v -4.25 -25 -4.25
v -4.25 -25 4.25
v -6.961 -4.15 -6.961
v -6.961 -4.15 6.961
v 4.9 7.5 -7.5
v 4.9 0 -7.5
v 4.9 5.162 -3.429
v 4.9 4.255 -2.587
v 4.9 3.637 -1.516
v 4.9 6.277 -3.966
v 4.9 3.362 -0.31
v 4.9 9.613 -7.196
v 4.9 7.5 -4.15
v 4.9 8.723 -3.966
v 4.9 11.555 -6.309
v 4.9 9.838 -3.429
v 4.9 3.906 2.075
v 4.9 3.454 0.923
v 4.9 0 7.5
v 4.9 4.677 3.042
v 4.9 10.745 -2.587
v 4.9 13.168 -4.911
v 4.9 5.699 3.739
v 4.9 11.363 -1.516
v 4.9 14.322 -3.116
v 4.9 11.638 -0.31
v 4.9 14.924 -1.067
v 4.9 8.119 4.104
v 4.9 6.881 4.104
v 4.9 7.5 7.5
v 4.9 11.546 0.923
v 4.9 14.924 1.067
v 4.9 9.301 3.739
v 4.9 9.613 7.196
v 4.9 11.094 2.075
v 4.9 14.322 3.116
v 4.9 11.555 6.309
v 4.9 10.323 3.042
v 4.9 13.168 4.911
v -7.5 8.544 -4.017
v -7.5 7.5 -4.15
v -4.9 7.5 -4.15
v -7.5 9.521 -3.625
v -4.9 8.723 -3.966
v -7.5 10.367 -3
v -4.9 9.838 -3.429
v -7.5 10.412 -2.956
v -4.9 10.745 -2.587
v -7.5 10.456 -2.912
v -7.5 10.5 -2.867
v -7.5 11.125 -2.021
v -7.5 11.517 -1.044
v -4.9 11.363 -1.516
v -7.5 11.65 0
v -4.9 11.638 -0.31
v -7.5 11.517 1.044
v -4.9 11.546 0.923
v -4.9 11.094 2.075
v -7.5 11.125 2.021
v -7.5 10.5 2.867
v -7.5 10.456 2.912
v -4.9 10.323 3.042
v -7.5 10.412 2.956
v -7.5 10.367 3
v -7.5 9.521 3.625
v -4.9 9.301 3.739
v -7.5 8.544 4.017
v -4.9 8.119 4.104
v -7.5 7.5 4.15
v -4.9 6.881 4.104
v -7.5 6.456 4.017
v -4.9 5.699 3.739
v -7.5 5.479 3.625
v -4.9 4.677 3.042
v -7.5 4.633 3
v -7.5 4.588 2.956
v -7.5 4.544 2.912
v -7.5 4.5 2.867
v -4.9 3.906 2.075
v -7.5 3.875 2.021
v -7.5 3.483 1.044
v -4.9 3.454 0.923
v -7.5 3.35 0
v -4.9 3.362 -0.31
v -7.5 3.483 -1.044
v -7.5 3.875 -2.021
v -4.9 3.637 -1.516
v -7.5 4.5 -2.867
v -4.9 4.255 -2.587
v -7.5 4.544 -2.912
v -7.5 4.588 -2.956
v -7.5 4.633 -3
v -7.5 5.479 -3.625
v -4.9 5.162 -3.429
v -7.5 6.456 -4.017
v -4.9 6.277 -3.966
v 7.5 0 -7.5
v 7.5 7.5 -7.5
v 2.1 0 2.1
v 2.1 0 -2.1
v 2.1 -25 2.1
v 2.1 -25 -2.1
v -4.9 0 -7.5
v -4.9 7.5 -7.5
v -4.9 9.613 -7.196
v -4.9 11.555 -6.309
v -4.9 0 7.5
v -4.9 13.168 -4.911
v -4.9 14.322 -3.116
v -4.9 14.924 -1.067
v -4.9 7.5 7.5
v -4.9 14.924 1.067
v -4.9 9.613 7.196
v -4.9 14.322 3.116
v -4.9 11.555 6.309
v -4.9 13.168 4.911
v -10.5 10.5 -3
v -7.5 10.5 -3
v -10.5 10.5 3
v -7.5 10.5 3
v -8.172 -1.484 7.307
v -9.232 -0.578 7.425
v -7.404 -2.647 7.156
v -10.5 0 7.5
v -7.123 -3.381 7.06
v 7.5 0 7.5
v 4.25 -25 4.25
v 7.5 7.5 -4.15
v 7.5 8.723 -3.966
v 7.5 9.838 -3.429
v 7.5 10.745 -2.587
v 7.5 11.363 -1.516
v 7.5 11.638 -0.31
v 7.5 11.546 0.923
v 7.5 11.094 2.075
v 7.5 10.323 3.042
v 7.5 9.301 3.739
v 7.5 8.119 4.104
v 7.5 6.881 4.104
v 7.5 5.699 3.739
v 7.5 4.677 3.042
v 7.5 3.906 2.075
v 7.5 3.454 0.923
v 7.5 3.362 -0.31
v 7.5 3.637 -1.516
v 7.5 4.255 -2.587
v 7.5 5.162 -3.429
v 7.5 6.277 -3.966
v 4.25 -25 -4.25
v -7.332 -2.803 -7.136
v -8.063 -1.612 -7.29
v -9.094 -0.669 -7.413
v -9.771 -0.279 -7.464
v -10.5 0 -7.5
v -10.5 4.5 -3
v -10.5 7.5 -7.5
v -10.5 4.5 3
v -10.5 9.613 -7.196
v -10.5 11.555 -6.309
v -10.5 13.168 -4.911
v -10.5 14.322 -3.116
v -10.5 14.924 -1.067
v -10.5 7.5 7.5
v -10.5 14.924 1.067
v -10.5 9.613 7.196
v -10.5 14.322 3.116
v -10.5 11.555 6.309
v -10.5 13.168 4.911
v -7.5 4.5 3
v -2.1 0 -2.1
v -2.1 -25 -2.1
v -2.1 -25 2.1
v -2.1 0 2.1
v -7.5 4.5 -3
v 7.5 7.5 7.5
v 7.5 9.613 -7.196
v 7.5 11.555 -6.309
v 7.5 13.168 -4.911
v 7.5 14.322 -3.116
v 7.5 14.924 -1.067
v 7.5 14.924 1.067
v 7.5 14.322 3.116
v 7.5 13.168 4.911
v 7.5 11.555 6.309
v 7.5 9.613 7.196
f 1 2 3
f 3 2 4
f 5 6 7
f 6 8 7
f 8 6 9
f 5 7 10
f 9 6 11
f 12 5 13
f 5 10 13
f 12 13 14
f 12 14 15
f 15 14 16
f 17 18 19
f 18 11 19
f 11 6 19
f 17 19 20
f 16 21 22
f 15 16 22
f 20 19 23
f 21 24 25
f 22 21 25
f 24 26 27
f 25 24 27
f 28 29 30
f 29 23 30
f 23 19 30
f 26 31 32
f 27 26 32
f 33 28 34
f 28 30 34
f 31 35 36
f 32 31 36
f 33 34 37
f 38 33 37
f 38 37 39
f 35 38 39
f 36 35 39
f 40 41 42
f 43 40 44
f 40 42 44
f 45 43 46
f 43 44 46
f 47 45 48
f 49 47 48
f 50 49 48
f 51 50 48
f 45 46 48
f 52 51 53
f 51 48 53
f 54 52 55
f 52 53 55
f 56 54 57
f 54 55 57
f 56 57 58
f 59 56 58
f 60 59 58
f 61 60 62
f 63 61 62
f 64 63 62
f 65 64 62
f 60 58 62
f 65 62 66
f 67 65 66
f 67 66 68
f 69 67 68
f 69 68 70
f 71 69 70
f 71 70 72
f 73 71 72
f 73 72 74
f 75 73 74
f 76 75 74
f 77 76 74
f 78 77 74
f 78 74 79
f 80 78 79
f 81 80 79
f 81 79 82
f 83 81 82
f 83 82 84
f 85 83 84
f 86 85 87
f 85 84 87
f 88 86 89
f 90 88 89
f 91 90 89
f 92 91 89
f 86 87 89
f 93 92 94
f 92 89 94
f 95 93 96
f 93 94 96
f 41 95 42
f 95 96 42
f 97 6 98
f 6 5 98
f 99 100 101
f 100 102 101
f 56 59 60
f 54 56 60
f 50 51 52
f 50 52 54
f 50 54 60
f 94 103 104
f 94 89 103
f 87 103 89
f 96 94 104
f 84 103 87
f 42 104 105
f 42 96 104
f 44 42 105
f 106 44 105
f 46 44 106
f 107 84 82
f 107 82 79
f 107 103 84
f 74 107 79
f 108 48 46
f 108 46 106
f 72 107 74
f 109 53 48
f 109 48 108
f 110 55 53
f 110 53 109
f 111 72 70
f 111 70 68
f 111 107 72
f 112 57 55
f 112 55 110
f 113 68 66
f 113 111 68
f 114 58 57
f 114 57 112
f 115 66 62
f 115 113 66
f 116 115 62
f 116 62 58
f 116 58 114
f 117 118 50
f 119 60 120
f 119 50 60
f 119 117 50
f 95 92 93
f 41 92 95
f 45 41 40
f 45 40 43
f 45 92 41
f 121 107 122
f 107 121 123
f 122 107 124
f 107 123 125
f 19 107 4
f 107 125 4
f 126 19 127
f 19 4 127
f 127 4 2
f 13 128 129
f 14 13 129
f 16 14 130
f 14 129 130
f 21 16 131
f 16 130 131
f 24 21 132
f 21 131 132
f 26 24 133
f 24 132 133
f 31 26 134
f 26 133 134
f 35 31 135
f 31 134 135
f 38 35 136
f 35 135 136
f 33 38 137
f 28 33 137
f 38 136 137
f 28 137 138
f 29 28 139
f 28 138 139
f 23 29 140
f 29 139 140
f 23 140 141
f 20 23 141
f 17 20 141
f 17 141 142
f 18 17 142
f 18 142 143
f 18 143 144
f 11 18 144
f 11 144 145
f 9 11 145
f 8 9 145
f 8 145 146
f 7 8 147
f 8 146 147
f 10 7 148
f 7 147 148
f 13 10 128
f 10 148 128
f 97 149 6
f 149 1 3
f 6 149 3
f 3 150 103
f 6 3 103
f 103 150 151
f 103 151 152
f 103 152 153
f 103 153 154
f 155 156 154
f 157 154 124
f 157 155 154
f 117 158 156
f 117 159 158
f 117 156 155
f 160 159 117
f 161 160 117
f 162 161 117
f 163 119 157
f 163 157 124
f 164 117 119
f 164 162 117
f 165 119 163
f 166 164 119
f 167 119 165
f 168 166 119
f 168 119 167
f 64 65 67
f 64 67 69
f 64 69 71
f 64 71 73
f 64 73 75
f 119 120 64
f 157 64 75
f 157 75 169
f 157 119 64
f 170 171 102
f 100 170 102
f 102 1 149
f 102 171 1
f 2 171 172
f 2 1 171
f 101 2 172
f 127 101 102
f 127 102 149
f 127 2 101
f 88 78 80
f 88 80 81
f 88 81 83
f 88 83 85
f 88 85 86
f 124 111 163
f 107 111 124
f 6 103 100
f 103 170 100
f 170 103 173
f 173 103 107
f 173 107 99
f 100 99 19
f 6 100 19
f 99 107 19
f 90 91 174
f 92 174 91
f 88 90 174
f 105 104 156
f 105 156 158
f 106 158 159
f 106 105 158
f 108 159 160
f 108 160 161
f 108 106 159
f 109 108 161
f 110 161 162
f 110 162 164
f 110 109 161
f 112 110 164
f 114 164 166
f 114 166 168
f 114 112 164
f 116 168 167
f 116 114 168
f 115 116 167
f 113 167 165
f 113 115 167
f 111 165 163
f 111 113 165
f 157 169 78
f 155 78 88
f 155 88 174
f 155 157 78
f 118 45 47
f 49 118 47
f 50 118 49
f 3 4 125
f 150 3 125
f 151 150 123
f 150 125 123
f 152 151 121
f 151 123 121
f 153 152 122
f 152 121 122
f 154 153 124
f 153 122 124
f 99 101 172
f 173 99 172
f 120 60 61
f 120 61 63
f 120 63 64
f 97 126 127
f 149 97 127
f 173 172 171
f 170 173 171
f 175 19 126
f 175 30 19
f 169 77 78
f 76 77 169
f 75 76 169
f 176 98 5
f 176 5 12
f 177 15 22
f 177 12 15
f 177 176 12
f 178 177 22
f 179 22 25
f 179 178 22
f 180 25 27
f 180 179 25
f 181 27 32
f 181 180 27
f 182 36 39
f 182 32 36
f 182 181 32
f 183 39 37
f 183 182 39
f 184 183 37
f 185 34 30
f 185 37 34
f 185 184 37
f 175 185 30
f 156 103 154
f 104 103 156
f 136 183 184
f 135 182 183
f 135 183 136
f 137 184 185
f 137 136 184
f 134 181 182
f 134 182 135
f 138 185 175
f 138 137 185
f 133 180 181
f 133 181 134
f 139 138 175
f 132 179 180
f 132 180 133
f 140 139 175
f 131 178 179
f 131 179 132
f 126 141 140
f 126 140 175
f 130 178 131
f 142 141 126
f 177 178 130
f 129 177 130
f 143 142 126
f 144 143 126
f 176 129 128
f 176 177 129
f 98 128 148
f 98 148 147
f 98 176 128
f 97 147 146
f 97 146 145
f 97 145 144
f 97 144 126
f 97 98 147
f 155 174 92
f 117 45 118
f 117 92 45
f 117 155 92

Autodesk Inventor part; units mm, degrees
ref_plane "YZ Plane" through (0, 0, 0) normal (1, 0, 0) x (0, 1, 0)
ref_plane "XZ Plane" through (0, 0, 0) normal (0, 1, 0) x (-1, 0, 0)
ref_plane "XY Plane" through (0, 0, 0) normal (0, 0, 1) x (1, 0, 0)
sketch "Sketch1" plane through (0, 0, 0) normal (0, 0, 1) x (1, 0, 0)
  line L0 (0, 0) -> (-7.5, 0)
  line L1 (-7.5, 0) -> (-7.5, 15)
  line L2 (-7.5, 15) -> (7.5, 15)
  line L3 (7.5, 15) -> (7.5, 0)
  line L4 (7.5, 0) -> (-7.5, 0)
  dimension "d55" = 7.5
  dimension "d56" = 15
  dimension "d57" = 15
extrude "Extrusion1" add sketch "Sketch1" along normal mid plane 15
sketch "Sketch11" plane through (0, 0, 7.5) normal (0, 0, 1) x (1, 0, 0)
  line L0 (7.5, 15) -> (-7.5, 15) projected
  line L1 (0, 15) -> (0, -25)
  line L2 (0, -25) -> (4.25, -25)
  line L3 (0, -25) -> (-4.25, -25)
  line L4 (-7.5, 0) -> (7.5, 0) projected
  line L5 (-4.25, -25) -> (-7.5, 0)
  line L6 (-7.5, 0) -> (7.5, 0)
  line L7 (7.5, 0) -> (4.25, -25)
  point P0 (0, 0)
  dimension "d58" = 40
  dimension "d59" = 4.25
  dimension "d60" = 4.25
extrude "Extrusion7" add sketch "Sketch11" against normal blind 15
sketch "Sketch13" plane through (0, 0, 0) normal (1, 0, 0) x (0, 1, 0)
  line L0 (15, -7.5) -> (15, 7.5) projected
  line L1 (15, 0) -> (-25, 0)
  line L2 (-25, 7.5) -> (-25, -7.5) projected
  line L3 (-25, 0) -> (-25, 4.25)
  line L4 (-25, 7.5) -> (-25, -7.5) projected
  line L5 (-25, 4.25) -> (-25, 0)
  line L6 (-25, 0) -> (-25, -4.25)
  line L7 (0, -7.5) -> (15, -7.5) projected
  line L8 (-25, -4.25) -> (0, -7.5)
  line L9 (0, -7.5) -> (0, 7.5)
  line L10 (0, 7.5) -> (-25, 4.25)
  line L11 (-25, 4.25) -> (-25, 7.5)
  line L12 (-25, 7.5) -> (0, 7.5)
  line L13 (-25, -4.25) -> (-25, -7.5)
  line L14 (-25, -7.5) -> (0, -7.5) projected
  line L15 (-25, -7.5) -> (0, -7.5)
  point P0 (0, 0)
  dimension "d68" = 40
  dimension "d69" = 4.25
  dimension "d70" = 4.25
extrude "Extrusion8" cut sketch "Sketch13" along normal through all both and the other way through all contours L14 L2 L8 | L10 L2 L12
sketch "Sketch15" plane through (-4.25, -25, -4.25) normal (0, -1, 0) x (1, 0, 0)
  line L0 (4.25, 4.25) -> (2.15, 4.25)
  line L1 (0, 8.5) -> (0, 0) projected
  line L2 (2.15, 4.25) -> (2.15, 2.15)
  line L3 (2.15, 2.15) -> (6.35, 2.15)
  line L4 (6.35, 2.15) -> (6.35, 6.35)
  line L5 (6.35, 6.35) -> (2.15, 6.35)
  line L6 (2.15, 6.35) -> (2.15, 4.25)
  point P0 (8.5, 8.5)
  point P1 (8.5, 0)
  dimension "d112" = 2.1
  dimension "d113" = 2.1
  dimension "d114" = 4.2
  dimension "d115" = 4.2
extrude "Extrusion9" cut sketch "Sketch15" against normal through all
sketch "Sketch16" plane through (0, 0, 7.5) normal (0, 0, 1) x (1, 0, 0)
  line L0 (0, 0) -> (4.9, 0)
  line L1 (-7.5, 0) -> (7.5, 0) projected
  line L2 (4.9, 0) -> (4.9, 16.5506)
  line L3 (0, 0) -> (-4.9, 0)
  line L4 (-4.9, 0) -> (-4.9, 16.5506)
  line L5 (-4.9, 16.5506) -> (4.9, 16.5506)
  dimension "d83" = 4.9
  dimension "d84" = 4.9
extrude "Extrusion10" cut sketch "Sketch16" against normal through all
sketch "Sketch17" plane through (7.5, 15, 7.5) normal (1, 0, 0) x (0, 0, -1)
  line L0 (15, 0) -> (0, 0) projected
  line L1 (0, 0) -> (7.5, 0)
  line L2 (7.5, 0) -> (7.5, -7.5)
  arc A0 (15, -7.5) -> (0, -7.5) centre (7.5, -7.5) ccw
  line L3 (0, 0) -> (0, -15) projected
  line L4 (0, -7.5) -> (0, 0)
  line L5 (0, 0) -> (15, 0)
  line L6 (15, -15) -> (15, 0) projected
  line L7 (15, 0) -> (15, -7.5)
  point P0 (7.5, -15)
  dimension "d87" = 7.5
extrude "Extrusion11" cut sketch "Sketch17" against normal through all
sketch "Sketch18" plane through (7.5, 0, 7.5) normal (1, 0, 0) x (0, 0, -1)
  line L0 (0, 0) -> (0, 15)
  line L1 (0, 15) -> (15, 15)
  line L2 (15, 15) -> (15, 0)
  line L3 (15, 0) -> (0, 0)
  line L4 (0, 15) -> (15, 0)
  line L5 (15, 15) -> (0, 0)
  circle A0 centre (7.5, 7.5) radius 4.15
  point P0 (7.5, 0)
  dimension "d90" = 15
  dimension "d91" = 8.3
extrude "Extrusion12" cut sketch "Sketch18" against normal blind 8.3 contours A0 L4 L5 | L5 L4 A0 | A0 L5 L4 | L4 L5 A0
sketch "Sketch19" plane through (-7.5, 0, -7.5) normal (-1, 0, 0) x (0, 0, 1)
  line L0 (0, 0) -> (0, 15)
  line L1 (0, 15) -> (15, 15)
  line L2 (15, 15) -> (15, 0)
  line L3 (15, 0) -> (0, 0) projected
  line L4 (15, 0) -> (0, 0)
  point P0 (7.5, 0)
  dimension "d94" = 15
extrude "Extrusion13" add sketch "Sketch19" along normal blind 3
sketch "Sketch20" plane through (-4.9, 0, 7.5) normal (1, 0, 0) x (0, 0, -1)
  line L0 (0, 0) -> (0, 15) projected
  line L1 (0, 0) -> (0, 15)
  line L2 (0, 15) -> (15, 15)
  line L3 (15, 0) -> (0, 0) projected
  line L4 (15, 15) -> (15, 0)
  line L5 (15, 0) -> (0, 0)
  line L6 (0, 0) -> (15, 15)
  line L7 (0, 15) -> (15, 0)
  circle A0 centre (7.5, 7.5) radius 4.15
  point P0 (7.5, 0)
  dimension "d97" = 15
  dimension "d98" = 8.3
extrude "Extrusion14" cut sketch "Sketch20" against normal blind 2.6 contours A0 L7 L6 | L6 L7 A0 | A0 L6 L7 | L7 L6 A0
sketch "Sketch21" plane through (-10.5, 0, -7.5) normal (-1, 0, 0) x (0, 0, 1)
  line L0 (0, 7.5) -> (0, 0) projected
  line L1 (15, 0) -> (15, 15) projected
  line L2 (0, 0) -> (15, 15)
  line L3 (0, 15) -> (0, 0) projected
  line L4 (15, 15) -> (0, 15)
  line L5 (0, 15) -> (15, 0)
  line L6 (7.5, 7.5) -> (7.5, 10.5)
  line L7 (7.5, 10.5) -> (10.5, 10.5)
  line L8 (10.5, 10.5) -> (10.5, 4.5)
  line L9 (10.5, 4.5) -> (4.5, 4.5)
  line L10 (4.5, 4.5) -> (4.5, 10.5)
  line L11 (4.5, 10.5) -> (10.5, 10.5)
  point P0 (7.5, 0)
  dimension "d101" = 3
  dimension "d102" = 3
  dimension "d103" = 6
  dimension "d104" = 6
extrude "Extrusion15" cut sketch "Sketch21" against normal blind 3 contours L10 L5 L2 | L2 L5 L9 | L11 L6 L5 | L6 L7 L2 | L2 L8 L5
sketch "Sketch23" plane through (-4.9, 0, 7.5) normal (1, 0, 0) x (0, 0, -1)
  line L0 (0, 0) -> (0, 15) projected
  line L1 (0, 0) -> (0, 15)
  line L2 (0, 15) -> (15, 15)
  line L3 (15, 15) -> (15, 0)
  line L4 (15, 0) -> (0, 0)
  line L5 (0, 15) -> (7.5, 15)
  arc A0 (15, 7.5) -> (0, 7.5) centre (7.5, 7.5) ccw
  line L6 (0, 7.5) -> (0, 15)
  line L7 (15, 15) -> (15, 7.5)
  point P0 (7.5, 0)
  point P1 (0, 7.5)
  dimension "d107" = 15
extrude "Extrusion16" cut sketch "Sketch23" against normal through all contours L0 L2 A0 | L2 L3 A0
fillet "Fillet2" radius 5 1 edges at (-7.5, 0, 0)
sketch "Sketch25" plane through (-10.5, 0, -7.5) normal (-1, 0, 0) x (0, 0, 1)
  point P0 (7.5, 0)
equation "\"d92\" = d91"
equation "\"d105\" = d101"
properties part number "Hip Joint 2"
